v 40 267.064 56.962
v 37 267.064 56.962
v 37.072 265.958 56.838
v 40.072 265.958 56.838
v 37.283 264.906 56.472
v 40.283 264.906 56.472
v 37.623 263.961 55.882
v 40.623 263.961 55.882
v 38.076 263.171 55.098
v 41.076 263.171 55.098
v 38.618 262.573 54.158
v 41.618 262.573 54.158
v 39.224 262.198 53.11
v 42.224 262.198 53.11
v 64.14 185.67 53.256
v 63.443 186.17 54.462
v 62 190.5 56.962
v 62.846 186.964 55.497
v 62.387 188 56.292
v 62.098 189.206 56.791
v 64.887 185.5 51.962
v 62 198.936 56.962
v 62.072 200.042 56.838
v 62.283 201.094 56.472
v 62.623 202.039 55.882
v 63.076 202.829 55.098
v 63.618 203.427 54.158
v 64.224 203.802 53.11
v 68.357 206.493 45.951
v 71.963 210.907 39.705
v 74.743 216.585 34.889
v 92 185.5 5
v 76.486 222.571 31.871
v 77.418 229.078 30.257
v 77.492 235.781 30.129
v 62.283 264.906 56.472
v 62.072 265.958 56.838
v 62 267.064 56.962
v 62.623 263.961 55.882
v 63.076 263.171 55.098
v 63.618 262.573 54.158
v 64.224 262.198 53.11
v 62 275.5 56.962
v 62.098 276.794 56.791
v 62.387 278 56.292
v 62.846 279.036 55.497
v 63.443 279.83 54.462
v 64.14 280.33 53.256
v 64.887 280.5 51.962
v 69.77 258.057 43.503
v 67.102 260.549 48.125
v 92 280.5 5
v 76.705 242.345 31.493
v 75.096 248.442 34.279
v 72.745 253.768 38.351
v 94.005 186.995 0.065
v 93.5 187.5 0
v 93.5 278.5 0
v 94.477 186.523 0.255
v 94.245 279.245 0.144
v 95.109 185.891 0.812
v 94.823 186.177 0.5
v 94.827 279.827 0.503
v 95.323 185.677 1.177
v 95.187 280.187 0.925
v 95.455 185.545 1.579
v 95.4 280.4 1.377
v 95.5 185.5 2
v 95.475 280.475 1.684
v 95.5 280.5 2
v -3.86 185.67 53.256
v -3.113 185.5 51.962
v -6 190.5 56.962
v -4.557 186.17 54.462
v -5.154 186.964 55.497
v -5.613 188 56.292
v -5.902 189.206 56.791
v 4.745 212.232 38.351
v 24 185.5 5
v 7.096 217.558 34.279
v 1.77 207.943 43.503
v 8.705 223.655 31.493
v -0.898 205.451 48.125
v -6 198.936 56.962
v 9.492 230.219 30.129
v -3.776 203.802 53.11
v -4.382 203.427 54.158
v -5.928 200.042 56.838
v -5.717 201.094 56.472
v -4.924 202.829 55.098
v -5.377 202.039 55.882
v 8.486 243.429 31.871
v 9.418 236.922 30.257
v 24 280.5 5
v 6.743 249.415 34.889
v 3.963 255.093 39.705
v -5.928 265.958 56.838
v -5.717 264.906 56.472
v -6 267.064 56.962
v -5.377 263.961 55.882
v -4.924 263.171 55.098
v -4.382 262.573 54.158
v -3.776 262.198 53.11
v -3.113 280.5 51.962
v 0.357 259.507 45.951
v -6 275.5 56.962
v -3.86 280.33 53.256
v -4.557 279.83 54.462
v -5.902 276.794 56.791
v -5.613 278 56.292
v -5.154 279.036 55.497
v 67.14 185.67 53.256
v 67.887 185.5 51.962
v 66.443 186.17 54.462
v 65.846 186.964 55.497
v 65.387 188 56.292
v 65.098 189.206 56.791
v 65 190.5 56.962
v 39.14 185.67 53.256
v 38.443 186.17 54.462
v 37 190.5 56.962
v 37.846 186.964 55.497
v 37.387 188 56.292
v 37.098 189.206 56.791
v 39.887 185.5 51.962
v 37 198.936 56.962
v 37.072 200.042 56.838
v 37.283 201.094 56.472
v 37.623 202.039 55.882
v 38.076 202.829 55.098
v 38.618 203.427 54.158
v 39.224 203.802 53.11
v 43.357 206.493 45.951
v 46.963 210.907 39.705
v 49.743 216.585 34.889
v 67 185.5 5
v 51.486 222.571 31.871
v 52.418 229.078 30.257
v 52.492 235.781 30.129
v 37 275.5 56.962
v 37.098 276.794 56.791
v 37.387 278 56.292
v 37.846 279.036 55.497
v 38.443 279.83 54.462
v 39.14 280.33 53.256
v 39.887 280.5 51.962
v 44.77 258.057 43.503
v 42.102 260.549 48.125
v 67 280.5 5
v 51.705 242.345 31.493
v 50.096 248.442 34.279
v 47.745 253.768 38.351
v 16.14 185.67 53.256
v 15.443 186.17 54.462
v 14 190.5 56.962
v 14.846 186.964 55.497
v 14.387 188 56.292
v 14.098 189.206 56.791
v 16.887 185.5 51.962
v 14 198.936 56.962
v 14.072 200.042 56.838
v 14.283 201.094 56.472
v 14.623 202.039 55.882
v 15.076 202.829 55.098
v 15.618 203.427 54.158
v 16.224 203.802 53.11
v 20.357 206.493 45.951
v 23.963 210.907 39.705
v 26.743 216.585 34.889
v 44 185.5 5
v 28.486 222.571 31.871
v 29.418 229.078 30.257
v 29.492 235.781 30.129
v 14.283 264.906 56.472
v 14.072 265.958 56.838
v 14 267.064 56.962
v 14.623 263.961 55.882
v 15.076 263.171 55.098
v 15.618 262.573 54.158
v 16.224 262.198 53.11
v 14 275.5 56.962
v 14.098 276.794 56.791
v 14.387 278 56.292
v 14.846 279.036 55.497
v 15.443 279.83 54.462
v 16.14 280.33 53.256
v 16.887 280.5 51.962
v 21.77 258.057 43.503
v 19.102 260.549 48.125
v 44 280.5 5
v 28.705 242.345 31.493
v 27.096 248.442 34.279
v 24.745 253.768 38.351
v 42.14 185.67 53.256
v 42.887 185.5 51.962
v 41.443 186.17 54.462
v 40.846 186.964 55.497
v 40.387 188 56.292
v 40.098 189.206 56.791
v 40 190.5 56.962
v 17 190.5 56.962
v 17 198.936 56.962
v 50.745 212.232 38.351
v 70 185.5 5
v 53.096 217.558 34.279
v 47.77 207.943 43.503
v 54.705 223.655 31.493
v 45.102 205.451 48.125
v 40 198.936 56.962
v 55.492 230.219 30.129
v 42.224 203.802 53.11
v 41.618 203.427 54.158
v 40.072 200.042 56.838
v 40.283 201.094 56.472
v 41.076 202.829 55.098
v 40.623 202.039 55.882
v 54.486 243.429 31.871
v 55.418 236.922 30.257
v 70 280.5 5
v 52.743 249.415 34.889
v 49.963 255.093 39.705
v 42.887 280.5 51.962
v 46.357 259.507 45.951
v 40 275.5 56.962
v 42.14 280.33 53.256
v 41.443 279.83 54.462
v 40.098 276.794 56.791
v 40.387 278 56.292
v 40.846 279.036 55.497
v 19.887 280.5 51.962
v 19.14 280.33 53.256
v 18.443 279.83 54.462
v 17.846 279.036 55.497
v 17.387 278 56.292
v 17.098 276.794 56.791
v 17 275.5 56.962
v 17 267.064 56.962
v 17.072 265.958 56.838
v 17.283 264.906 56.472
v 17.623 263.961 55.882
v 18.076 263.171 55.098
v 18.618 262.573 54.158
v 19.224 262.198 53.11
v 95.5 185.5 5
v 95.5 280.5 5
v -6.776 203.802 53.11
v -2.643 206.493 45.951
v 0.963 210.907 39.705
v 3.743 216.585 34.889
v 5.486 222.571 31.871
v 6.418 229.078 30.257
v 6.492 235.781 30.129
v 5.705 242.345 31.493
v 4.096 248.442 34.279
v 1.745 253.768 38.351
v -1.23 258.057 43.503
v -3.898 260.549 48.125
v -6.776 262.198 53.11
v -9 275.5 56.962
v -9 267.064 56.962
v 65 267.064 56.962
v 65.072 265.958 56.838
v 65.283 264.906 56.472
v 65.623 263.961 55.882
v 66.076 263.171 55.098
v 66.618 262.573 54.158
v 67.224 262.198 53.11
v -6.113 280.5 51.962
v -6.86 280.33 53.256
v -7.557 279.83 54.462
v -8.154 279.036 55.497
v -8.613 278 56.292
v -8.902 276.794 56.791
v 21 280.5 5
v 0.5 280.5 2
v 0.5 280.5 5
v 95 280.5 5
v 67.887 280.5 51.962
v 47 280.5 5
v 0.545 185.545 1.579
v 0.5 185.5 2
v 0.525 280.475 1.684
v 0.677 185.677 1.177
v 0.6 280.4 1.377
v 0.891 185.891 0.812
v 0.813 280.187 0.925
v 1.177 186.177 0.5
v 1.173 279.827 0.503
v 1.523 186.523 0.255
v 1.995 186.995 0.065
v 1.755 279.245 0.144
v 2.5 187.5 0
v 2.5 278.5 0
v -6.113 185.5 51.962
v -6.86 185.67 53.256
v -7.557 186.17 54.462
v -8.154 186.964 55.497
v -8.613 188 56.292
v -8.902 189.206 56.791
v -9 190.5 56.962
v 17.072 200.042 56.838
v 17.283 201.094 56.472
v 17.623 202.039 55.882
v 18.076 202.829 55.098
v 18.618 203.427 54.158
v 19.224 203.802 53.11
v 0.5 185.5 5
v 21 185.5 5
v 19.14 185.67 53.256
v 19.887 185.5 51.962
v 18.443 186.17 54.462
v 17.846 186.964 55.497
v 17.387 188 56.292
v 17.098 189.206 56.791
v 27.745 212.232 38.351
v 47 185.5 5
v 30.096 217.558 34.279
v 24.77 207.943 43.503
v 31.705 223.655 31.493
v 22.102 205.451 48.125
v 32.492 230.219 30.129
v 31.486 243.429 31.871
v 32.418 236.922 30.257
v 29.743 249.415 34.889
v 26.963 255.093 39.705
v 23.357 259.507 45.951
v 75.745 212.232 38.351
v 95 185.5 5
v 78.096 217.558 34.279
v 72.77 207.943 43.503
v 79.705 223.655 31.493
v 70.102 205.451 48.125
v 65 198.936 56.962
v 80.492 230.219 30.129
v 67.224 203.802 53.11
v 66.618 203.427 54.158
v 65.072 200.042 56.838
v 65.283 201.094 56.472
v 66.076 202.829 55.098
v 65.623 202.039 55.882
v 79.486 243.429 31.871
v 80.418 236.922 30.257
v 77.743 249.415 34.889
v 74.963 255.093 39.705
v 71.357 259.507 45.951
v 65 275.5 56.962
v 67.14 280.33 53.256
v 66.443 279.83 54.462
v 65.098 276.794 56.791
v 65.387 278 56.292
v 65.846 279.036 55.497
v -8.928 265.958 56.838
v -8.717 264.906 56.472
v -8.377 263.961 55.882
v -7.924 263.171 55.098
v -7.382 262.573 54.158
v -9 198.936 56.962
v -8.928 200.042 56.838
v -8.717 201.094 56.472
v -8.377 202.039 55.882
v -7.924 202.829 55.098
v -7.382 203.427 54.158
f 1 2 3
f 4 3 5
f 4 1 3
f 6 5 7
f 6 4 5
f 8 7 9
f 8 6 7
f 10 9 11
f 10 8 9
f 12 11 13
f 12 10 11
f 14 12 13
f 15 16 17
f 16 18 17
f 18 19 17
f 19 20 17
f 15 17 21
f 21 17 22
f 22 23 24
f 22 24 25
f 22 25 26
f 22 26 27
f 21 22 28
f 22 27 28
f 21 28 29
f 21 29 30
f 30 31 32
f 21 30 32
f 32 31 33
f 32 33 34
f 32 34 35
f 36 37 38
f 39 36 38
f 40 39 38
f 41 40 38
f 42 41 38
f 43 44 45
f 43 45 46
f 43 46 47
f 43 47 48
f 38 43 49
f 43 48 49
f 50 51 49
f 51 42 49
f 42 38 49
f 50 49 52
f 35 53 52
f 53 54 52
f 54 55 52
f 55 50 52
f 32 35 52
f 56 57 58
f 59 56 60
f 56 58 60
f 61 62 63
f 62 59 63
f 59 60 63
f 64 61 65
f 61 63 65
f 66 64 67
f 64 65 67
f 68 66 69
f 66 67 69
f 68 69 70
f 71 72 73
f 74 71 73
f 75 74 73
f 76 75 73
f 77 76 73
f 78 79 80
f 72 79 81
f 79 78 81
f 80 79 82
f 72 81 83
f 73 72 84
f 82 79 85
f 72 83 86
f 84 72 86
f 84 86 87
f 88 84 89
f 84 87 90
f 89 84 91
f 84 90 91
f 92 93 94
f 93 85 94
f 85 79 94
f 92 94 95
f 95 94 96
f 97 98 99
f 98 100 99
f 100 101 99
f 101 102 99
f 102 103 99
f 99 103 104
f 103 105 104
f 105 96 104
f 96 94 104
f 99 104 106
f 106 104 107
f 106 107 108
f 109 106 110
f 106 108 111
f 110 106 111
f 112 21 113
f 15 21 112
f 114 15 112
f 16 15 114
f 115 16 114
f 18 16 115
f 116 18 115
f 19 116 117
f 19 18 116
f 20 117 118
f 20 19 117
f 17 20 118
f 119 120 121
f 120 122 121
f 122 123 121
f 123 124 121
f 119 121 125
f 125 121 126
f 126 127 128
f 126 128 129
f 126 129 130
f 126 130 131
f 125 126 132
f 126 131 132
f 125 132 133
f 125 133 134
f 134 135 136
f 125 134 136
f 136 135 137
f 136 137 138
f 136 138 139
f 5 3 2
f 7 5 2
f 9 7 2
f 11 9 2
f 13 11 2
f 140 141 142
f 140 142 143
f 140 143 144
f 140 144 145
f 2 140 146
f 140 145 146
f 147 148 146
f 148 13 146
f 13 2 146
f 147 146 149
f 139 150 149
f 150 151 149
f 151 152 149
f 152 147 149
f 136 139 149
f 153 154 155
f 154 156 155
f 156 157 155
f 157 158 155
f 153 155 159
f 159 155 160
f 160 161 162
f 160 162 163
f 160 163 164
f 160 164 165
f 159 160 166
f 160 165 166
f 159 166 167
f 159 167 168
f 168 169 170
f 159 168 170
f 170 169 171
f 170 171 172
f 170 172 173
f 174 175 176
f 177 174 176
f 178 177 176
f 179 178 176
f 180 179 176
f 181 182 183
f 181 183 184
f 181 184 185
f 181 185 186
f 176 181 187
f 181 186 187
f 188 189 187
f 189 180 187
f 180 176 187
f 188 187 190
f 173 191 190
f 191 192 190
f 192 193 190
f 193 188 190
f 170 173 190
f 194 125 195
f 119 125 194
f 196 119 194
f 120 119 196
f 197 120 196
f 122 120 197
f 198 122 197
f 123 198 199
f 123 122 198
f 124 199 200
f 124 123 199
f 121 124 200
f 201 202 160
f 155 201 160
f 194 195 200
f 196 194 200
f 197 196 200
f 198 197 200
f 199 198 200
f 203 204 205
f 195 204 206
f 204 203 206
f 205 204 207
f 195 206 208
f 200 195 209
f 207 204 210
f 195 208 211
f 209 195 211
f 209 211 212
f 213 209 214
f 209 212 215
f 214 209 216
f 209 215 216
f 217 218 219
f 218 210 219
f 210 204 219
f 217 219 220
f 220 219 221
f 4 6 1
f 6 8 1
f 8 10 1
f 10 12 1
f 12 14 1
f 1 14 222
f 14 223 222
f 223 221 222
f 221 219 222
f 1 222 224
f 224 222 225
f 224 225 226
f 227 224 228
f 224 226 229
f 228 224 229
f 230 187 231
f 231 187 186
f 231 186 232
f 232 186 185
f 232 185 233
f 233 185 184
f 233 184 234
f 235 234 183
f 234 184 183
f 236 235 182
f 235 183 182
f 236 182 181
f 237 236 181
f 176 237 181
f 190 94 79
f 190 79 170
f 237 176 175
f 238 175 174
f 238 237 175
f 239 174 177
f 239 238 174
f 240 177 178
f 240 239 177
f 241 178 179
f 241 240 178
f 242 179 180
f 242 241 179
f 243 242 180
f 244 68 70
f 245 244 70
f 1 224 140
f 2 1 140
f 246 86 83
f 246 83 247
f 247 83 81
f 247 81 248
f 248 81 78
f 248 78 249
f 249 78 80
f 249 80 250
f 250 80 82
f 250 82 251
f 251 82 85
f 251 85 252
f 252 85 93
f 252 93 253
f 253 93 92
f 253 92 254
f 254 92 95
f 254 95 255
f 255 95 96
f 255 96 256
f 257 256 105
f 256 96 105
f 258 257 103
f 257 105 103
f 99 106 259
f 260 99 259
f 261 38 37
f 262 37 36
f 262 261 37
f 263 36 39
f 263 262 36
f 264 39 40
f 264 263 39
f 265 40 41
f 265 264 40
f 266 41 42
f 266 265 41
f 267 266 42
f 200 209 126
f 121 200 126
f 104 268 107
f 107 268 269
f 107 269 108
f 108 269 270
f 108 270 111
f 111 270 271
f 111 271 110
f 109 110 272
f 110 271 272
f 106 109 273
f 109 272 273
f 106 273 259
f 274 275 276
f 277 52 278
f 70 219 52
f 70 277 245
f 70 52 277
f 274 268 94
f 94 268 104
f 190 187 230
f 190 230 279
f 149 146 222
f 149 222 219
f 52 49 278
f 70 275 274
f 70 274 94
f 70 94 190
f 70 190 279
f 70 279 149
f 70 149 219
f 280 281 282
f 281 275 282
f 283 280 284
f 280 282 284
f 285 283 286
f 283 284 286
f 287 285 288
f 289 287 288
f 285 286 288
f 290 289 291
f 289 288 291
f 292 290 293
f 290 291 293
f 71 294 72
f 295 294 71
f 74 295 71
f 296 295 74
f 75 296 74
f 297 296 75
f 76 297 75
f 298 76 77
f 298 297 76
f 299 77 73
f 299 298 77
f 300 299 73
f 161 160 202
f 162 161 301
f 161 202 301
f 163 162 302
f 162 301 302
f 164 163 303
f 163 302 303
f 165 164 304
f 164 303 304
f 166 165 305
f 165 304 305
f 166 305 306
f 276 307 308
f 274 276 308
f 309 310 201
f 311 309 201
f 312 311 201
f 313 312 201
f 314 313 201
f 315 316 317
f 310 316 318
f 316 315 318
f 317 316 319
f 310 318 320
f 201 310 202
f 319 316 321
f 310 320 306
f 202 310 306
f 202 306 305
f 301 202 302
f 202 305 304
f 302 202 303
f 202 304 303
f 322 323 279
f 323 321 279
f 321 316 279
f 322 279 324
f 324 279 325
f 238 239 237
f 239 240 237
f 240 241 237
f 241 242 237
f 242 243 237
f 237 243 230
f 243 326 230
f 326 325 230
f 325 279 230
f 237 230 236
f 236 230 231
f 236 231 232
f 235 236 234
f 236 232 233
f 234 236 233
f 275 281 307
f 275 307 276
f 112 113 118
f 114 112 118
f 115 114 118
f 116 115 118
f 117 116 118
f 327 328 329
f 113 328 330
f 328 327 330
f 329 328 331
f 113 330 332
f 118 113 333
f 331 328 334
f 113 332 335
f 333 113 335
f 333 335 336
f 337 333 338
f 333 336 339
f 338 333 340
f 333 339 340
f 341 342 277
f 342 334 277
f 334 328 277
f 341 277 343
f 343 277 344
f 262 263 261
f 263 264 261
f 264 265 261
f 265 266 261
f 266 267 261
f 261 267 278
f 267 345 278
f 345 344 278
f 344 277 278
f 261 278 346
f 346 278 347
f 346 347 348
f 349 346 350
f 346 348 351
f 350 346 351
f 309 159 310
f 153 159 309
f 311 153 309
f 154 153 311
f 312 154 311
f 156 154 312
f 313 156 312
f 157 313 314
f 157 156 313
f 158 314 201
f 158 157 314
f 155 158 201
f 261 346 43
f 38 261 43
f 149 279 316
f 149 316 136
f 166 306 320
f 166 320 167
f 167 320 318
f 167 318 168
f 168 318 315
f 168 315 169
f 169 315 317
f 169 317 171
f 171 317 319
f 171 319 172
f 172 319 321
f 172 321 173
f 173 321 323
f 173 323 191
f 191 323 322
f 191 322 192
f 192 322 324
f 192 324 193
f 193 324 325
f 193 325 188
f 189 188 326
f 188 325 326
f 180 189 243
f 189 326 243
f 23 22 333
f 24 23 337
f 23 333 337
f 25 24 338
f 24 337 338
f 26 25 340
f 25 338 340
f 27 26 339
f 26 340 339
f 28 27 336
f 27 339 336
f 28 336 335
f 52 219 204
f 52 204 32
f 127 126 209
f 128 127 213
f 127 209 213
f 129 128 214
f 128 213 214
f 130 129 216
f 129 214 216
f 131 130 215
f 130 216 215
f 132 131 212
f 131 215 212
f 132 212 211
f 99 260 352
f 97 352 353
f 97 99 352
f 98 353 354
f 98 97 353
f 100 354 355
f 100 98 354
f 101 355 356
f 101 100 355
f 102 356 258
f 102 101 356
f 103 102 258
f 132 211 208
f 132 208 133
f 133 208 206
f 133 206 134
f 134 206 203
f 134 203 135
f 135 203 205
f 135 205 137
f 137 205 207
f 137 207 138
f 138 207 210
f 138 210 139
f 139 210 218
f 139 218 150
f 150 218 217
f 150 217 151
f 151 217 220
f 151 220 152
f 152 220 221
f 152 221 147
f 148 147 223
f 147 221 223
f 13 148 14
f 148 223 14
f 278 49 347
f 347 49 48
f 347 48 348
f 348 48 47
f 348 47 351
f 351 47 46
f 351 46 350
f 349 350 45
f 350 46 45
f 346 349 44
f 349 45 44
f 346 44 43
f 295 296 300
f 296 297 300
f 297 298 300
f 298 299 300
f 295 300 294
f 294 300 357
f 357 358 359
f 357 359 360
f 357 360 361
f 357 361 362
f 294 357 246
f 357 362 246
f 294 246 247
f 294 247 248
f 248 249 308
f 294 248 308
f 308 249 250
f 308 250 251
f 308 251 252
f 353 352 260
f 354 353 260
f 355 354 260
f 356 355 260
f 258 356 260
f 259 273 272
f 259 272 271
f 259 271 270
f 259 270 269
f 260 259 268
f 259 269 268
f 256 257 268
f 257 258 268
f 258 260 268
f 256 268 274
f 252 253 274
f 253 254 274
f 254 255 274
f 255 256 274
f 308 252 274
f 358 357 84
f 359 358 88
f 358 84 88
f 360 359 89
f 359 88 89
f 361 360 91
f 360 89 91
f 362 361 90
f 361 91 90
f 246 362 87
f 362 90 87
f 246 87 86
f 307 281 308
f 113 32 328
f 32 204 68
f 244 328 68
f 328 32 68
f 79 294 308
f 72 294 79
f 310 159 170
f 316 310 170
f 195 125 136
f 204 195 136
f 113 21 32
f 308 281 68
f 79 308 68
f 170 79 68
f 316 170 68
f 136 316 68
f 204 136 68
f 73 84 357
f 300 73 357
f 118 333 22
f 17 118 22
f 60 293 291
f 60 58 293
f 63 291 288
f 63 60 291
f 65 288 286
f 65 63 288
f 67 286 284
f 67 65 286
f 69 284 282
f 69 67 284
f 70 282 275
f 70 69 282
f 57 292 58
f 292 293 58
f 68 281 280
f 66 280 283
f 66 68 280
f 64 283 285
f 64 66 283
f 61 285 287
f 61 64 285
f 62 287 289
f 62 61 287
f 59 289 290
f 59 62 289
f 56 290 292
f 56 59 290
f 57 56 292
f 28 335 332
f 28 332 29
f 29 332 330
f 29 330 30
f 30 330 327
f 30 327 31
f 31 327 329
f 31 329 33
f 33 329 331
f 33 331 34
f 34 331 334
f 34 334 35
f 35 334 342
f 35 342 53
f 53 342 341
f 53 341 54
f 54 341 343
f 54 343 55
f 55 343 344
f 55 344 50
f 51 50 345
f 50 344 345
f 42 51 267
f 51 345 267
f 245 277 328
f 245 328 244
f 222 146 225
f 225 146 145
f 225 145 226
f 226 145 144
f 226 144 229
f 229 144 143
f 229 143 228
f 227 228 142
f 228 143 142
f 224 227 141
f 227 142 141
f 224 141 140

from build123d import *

# Parameters (mm, degrees)
SKETCH024_W     = 95
SKETCH024_H     = 95
PAD016_DEPTH    = 5
PAD017_DEPTH    = 95
SKETCH029_R     = 30
POCKET009_DEPTH = 104.501
FILLET022_R     = 5
FILLET023_R     = 2


with BuildPart() as part:
    # Sketch024 → Pad016 (new body)
    with BuildSketch(Plane.XY):
        Rectangle(SKETCH024_W, SKETCH024_H)
    extrude(amount=PAD016_DEPTH)

    # Sketch025 (on DatumPlane) → Pad017 (join)
    with BuildSketch(Plane(origin=(0, 47.5, 0), x_dir=(-1, 0, 0), z_dir=(0, 1, 0))):
        Polygon((-47, 5), (-17, 56.961524), (-14, 56.961524), (-44, 5), align=None)
        Polygon((-22, 5), (8, 56.961524), (11, 56.961524), (-19, 5), align=None)
        Polygon((1, 5), (31, 56.961524), (34, 56.961524), (4, 5), align=None)
        Polygon((24, 5), (54, 56.961524), (57, 56.961524), (27, 5), align=None)
    extrude(amount=-PAD017_DEPTH)

    # Sketch029 (on DatumPlane) → Pocket009 (cut, through all)
    with BuildSketch(Plane.YZ.offset(47.5)):
        with Locations((0, 60)):
            Circle(SKETCH029_R)
    extrude(amount=-POCKET009_DEPTH, mode=Mode.SUBTRACT)

    # Fillet022
    fillet022_edges = [part.edges().sort_by_distance(p)[0] for p in [
        (15.5, -47.5, 56.961524),
        (15.5, -29.845731, 56.961524),
        (-9.5, -47.5, 56.961524),
        (-9.5, -29.845731, 56.961524),
        (-32.5, -47.5, 56.961524),
        (-32.5, -29.845731, 56.961524),
        (-55.5, -47.5, 56.961524),
        (-55.5, -29.845731, 56.961524),
        (15.5, 29.845731, 56.961524),
        (15.5, 47.5, 56.961524),
        (-9.5, 29.845731, 56.961524),
        (-9.5, 47.5, 56.961524),
        (-32.5, 29.845731, 56.961524),
        (-32.5, 47.5, 56.961524),
        (-55.5, 29.845731, 56.961524),
        (-55.5, 47.5, 56.961524),
    ]]
    fillet(fillet022_edges, radius=FILLET022_R)

    # Fillet023
    fillet023_edges = [part.edges().sort_by_distance(p)[0] for p in [
        (0, -47.5, 0),
        (47.5, 0, 0),
        (0, 47.5, 0),
        (-47.5, 0, 0),
    ]]
    fillet(fillet023_edges, radius=FILLET023_R)


with BuildPart() as part_1:
    # Body011 placement: moved
    add(part.part.moved(Location((48, 233, 0))))


solid = part_1.part
